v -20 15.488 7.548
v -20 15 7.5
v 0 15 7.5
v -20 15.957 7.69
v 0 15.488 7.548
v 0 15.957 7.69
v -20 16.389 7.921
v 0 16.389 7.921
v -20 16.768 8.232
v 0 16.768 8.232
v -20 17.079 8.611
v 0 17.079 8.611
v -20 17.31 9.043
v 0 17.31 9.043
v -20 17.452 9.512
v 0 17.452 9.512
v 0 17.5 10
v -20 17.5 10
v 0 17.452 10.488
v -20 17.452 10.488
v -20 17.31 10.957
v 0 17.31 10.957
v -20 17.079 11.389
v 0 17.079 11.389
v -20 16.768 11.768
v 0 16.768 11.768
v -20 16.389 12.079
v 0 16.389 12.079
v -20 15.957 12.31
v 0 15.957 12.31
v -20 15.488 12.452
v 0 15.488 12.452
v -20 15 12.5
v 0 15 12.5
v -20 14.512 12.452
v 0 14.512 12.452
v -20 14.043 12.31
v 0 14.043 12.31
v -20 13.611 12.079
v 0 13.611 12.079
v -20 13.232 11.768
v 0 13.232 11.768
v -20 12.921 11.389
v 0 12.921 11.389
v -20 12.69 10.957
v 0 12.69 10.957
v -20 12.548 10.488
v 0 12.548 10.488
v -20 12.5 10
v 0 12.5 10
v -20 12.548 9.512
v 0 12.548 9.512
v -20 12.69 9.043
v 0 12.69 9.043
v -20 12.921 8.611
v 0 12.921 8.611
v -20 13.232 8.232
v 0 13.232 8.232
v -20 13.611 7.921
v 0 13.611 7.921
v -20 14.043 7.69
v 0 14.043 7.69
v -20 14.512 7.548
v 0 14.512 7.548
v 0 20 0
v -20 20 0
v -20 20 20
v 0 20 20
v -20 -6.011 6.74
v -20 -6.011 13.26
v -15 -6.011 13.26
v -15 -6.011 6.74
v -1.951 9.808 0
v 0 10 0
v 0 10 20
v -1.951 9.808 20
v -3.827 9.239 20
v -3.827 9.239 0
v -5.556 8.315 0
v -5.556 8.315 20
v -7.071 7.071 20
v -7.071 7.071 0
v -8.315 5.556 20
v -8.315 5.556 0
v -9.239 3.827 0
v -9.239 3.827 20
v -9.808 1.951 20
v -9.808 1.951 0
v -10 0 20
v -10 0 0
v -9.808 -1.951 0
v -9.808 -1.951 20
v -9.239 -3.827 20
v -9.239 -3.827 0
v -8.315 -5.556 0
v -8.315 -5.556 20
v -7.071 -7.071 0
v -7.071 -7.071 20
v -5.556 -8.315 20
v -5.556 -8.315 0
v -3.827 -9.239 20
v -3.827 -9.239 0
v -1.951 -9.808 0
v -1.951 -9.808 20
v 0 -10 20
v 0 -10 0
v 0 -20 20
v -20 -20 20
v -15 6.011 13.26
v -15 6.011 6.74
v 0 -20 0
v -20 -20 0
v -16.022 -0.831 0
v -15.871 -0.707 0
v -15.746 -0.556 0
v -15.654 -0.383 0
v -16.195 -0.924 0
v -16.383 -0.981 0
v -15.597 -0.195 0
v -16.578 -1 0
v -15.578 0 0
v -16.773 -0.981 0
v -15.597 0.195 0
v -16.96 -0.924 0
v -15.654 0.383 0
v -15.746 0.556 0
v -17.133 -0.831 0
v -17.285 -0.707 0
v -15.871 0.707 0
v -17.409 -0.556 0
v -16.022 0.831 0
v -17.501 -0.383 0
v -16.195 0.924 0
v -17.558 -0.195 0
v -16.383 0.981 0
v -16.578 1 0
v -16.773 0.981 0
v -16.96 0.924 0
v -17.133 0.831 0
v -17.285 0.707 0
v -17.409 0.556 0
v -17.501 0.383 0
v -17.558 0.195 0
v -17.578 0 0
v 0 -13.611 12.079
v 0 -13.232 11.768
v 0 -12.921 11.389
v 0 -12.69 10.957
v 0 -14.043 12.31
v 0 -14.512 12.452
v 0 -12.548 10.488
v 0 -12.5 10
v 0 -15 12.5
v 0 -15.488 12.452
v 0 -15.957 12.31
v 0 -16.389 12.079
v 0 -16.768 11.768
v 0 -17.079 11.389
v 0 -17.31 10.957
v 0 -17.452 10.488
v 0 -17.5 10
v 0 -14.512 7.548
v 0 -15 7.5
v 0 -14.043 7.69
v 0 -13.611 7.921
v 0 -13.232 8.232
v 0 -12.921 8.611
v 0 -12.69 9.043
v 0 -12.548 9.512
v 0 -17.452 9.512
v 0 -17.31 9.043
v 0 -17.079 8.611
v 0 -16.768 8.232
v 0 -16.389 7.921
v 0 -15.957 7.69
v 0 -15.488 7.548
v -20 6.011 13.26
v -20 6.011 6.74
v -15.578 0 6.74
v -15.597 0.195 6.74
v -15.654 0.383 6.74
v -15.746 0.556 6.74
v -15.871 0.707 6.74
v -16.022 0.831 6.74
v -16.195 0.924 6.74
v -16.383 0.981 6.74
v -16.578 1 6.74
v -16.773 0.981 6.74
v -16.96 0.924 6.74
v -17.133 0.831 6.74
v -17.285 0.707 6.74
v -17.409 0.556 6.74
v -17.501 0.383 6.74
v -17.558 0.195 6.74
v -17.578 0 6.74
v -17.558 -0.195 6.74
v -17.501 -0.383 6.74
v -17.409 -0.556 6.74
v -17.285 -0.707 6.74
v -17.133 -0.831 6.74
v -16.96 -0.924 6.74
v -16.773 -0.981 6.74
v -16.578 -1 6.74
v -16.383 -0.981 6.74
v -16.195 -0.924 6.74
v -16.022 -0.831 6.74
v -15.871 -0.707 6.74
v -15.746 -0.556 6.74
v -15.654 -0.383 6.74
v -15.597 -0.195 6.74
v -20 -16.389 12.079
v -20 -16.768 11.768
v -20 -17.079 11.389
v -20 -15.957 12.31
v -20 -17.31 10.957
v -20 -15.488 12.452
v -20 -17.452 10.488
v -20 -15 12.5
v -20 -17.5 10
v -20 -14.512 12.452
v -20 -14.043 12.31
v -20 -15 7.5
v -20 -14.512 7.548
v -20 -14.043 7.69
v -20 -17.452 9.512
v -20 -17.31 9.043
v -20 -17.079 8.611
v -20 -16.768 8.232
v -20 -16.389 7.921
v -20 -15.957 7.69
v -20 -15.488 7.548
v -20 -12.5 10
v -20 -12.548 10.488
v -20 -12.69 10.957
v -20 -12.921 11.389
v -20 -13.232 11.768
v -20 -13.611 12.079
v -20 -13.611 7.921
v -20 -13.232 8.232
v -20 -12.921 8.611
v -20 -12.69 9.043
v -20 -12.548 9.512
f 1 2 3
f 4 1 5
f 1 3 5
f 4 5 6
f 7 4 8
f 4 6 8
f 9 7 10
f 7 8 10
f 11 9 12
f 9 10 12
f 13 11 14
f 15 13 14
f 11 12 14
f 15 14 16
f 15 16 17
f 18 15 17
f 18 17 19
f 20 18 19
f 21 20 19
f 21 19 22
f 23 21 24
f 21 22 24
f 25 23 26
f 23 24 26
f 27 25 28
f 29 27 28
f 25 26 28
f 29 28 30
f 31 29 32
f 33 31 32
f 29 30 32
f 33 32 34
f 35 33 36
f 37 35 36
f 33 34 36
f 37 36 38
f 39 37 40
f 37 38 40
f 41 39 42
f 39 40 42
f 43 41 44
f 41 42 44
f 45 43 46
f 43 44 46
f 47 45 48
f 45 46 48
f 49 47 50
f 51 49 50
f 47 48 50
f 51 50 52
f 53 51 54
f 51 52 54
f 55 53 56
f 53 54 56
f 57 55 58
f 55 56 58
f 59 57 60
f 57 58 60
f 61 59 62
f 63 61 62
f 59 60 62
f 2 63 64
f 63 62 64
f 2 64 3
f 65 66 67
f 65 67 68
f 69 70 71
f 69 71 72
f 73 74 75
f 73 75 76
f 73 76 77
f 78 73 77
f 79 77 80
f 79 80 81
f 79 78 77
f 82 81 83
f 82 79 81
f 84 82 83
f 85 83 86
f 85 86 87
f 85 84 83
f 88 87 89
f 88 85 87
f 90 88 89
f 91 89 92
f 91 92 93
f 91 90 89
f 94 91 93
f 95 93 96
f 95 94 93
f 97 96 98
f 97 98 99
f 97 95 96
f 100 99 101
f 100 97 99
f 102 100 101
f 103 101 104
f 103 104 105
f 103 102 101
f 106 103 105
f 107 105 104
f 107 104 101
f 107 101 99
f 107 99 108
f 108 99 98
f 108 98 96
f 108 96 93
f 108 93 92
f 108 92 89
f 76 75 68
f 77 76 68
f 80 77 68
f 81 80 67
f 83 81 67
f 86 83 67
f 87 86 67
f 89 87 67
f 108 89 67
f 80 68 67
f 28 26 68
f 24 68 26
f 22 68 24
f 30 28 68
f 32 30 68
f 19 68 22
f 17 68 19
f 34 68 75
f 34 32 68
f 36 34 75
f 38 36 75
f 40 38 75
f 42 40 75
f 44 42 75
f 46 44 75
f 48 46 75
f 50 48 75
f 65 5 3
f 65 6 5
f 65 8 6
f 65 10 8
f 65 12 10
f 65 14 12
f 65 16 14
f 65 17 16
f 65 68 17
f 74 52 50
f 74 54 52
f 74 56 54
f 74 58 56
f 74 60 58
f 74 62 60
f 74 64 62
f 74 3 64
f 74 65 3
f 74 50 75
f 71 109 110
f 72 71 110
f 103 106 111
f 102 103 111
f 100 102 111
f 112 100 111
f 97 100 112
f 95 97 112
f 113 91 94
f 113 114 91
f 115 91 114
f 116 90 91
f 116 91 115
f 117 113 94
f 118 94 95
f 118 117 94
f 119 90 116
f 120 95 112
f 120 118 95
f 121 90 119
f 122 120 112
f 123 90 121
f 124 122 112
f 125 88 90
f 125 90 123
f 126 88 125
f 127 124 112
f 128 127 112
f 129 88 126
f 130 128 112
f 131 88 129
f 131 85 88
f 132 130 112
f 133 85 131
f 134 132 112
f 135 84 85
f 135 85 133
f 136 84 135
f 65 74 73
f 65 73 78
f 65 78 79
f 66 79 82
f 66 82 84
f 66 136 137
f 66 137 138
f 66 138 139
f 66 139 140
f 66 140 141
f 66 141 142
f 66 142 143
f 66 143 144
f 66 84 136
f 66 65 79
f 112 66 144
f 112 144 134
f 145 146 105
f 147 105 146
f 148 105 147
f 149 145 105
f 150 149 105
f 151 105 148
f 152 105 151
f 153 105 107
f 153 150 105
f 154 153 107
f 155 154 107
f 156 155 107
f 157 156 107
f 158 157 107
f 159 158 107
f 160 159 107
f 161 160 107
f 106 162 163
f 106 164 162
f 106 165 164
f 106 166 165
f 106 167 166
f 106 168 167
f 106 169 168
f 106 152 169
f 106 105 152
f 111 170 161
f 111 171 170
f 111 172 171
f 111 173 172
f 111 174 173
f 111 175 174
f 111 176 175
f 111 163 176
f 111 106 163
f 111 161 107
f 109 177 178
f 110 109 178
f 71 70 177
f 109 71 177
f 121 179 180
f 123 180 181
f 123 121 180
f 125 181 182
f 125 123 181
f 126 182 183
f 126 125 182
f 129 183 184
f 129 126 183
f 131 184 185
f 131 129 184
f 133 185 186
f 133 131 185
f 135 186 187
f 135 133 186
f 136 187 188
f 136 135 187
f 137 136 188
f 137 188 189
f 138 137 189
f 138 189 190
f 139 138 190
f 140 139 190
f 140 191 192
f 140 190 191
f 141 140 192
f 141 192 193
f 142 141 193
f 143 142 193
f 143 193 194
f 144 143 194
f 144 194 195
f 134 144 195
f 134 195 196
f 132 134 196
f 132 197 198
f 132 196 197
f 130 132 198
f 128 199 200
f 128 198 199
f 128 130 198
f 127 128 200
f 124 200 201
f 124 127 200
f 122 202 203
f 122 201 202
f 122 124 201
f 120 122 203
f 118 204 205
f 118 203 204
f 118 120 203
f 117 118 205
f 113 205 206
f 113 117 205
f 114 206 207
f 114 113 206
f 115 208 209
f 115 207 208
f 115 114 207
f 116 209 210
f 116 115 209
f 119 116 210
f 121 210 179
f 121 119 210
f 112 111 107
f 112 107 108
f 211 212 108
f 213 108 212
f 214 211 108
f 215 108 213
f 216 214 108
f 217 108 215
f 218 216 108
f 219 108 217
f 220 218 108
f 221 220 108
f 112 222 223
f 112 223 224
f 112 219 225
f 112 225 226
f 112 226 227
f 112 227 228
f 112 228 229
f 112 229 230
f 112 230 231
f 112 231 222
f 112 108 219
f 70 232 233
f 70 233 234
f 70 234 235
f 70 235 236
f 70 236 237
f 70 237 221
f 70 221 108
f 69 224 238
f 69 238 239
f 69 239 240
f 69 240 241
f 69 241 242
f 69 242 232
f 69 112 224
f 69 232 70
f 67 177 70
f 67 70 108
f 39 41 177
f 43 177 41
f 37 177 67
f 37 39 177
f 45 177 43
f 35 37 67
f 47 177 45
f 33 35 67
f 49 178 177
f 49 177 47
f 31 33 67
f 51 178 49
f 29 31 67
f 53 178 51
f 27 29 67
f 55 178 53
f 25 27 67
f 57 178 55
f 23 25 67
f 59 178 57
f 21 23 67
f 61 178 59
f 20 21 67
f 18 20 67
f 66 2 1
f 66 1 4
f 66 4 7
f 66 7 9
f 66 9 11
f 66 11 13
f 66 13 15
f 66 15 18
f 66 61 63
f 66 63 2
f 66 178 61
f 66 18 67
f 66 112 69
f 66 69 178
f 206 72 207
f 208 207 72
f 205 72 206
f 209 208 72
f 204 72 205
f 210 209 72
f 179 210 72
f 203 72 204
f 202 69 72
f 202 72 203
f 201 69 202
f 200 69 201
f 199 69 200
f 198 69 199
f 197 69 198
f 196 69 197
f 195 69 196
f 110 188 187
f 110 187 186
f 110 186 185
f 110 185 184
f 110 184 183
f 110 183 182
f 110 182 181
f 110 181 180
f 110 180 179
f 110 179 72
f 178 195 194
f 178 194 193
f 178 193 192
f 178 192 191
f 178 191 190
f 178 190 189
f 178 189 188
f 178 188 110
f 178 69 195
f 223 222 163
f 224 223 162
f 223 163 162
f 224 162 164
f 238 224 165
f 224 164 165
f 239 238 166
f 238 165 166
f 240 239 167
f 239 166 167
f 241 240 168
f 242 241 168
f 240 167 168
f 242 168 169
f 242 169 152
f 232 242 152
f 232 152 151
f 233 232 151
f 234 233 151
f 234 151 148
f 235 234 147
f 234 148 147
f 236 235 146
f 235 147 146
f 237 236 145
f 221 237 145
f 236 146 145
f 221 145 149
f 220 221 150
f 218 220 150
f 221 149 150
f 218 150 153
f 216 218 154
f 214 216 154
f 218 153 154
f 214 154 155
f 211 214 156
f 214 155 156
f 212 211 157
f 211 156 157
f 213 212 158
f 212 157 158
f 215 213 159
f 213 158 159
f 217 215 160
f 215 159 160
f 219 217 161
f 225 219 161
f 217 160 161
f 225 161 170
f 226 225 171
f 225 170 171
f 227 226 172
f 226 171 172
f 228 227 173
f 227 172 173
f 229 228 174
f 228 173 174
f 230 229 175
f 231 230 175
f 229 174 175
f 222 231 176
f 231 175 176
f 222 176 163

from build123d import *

# Parameters (mm, degrees)
EXTRUDE_1_DEPTH     = 20
SKETCH_3_R          = 2.5
CUT_EXTRUDE_1_DEPTH = 20
SKETCH_9_W          = 6.520982116
SKETCH_9_H          = 12.021095894
CUT_EXTRUDE_4_DEPTH = 5
SKETCH_10_R         = 1
CUT_EXTRUDE_6_DEPTH = 7


with BuildPart() as part:
    # 草图1 → 凸台-拉伸1 (new body)
    with BuildSketch(Plane.XY):
        with BuildLine():
            Line((0, 20), (0, 10))
            ThreePointArc((0, 10), (-10, 0), (0, -10))
            Line((0, -10), (0, -20))
            Line((0, -20), (-20, -20))
            Line((-20, -20), (-20, 20))
            Line((-20, 20), (0, 20))
        make_face()
    extrude(amount=EXTRUDE_1_DEPTH)

    # 草图3 → 切除-拉伸1 (cut)
    with BuildSketch(Plane(origin=(0, 0, 0), x_dir=(0, 0, -1), z_dir=(1, 0, 0))):
        with Locations((-10, 15)):
            Circle(SKETCH_3_R)
        with Locations((-10, -15)):
            Circle(SKETCH_3_R)
    extrude(amount=-CUT_EXTRUDE_1_DEPTH, mode=Mode.SUBTRACT)

    # 草图9 → 切除-拉伸4 (cut)
    with BuildSketch(Plane(origin=(-20, 0, 0), x_dir=(0, 0, -1), z_dir=(1, 0, 0))):
        with Locations((-10, 0)):
            Rectangle(SKETCH_9_W, SKETCH_9_H)
    extrude(amount=CUT_EXTRUDE_4_DEPTH, mode=Mode.SUBTRACT)

    # 草图10 → 切除-拉伸6 (cut)
    with BuildSketch(Plane.XY):
        with Locations((-16.577606786, 0)):
            Circle(SKETCH_10_R)
    extrude(amount=CUT_EXTRUDE_6_DEPTH, mode=Mode.SUBTRACT)


solid = part.part
